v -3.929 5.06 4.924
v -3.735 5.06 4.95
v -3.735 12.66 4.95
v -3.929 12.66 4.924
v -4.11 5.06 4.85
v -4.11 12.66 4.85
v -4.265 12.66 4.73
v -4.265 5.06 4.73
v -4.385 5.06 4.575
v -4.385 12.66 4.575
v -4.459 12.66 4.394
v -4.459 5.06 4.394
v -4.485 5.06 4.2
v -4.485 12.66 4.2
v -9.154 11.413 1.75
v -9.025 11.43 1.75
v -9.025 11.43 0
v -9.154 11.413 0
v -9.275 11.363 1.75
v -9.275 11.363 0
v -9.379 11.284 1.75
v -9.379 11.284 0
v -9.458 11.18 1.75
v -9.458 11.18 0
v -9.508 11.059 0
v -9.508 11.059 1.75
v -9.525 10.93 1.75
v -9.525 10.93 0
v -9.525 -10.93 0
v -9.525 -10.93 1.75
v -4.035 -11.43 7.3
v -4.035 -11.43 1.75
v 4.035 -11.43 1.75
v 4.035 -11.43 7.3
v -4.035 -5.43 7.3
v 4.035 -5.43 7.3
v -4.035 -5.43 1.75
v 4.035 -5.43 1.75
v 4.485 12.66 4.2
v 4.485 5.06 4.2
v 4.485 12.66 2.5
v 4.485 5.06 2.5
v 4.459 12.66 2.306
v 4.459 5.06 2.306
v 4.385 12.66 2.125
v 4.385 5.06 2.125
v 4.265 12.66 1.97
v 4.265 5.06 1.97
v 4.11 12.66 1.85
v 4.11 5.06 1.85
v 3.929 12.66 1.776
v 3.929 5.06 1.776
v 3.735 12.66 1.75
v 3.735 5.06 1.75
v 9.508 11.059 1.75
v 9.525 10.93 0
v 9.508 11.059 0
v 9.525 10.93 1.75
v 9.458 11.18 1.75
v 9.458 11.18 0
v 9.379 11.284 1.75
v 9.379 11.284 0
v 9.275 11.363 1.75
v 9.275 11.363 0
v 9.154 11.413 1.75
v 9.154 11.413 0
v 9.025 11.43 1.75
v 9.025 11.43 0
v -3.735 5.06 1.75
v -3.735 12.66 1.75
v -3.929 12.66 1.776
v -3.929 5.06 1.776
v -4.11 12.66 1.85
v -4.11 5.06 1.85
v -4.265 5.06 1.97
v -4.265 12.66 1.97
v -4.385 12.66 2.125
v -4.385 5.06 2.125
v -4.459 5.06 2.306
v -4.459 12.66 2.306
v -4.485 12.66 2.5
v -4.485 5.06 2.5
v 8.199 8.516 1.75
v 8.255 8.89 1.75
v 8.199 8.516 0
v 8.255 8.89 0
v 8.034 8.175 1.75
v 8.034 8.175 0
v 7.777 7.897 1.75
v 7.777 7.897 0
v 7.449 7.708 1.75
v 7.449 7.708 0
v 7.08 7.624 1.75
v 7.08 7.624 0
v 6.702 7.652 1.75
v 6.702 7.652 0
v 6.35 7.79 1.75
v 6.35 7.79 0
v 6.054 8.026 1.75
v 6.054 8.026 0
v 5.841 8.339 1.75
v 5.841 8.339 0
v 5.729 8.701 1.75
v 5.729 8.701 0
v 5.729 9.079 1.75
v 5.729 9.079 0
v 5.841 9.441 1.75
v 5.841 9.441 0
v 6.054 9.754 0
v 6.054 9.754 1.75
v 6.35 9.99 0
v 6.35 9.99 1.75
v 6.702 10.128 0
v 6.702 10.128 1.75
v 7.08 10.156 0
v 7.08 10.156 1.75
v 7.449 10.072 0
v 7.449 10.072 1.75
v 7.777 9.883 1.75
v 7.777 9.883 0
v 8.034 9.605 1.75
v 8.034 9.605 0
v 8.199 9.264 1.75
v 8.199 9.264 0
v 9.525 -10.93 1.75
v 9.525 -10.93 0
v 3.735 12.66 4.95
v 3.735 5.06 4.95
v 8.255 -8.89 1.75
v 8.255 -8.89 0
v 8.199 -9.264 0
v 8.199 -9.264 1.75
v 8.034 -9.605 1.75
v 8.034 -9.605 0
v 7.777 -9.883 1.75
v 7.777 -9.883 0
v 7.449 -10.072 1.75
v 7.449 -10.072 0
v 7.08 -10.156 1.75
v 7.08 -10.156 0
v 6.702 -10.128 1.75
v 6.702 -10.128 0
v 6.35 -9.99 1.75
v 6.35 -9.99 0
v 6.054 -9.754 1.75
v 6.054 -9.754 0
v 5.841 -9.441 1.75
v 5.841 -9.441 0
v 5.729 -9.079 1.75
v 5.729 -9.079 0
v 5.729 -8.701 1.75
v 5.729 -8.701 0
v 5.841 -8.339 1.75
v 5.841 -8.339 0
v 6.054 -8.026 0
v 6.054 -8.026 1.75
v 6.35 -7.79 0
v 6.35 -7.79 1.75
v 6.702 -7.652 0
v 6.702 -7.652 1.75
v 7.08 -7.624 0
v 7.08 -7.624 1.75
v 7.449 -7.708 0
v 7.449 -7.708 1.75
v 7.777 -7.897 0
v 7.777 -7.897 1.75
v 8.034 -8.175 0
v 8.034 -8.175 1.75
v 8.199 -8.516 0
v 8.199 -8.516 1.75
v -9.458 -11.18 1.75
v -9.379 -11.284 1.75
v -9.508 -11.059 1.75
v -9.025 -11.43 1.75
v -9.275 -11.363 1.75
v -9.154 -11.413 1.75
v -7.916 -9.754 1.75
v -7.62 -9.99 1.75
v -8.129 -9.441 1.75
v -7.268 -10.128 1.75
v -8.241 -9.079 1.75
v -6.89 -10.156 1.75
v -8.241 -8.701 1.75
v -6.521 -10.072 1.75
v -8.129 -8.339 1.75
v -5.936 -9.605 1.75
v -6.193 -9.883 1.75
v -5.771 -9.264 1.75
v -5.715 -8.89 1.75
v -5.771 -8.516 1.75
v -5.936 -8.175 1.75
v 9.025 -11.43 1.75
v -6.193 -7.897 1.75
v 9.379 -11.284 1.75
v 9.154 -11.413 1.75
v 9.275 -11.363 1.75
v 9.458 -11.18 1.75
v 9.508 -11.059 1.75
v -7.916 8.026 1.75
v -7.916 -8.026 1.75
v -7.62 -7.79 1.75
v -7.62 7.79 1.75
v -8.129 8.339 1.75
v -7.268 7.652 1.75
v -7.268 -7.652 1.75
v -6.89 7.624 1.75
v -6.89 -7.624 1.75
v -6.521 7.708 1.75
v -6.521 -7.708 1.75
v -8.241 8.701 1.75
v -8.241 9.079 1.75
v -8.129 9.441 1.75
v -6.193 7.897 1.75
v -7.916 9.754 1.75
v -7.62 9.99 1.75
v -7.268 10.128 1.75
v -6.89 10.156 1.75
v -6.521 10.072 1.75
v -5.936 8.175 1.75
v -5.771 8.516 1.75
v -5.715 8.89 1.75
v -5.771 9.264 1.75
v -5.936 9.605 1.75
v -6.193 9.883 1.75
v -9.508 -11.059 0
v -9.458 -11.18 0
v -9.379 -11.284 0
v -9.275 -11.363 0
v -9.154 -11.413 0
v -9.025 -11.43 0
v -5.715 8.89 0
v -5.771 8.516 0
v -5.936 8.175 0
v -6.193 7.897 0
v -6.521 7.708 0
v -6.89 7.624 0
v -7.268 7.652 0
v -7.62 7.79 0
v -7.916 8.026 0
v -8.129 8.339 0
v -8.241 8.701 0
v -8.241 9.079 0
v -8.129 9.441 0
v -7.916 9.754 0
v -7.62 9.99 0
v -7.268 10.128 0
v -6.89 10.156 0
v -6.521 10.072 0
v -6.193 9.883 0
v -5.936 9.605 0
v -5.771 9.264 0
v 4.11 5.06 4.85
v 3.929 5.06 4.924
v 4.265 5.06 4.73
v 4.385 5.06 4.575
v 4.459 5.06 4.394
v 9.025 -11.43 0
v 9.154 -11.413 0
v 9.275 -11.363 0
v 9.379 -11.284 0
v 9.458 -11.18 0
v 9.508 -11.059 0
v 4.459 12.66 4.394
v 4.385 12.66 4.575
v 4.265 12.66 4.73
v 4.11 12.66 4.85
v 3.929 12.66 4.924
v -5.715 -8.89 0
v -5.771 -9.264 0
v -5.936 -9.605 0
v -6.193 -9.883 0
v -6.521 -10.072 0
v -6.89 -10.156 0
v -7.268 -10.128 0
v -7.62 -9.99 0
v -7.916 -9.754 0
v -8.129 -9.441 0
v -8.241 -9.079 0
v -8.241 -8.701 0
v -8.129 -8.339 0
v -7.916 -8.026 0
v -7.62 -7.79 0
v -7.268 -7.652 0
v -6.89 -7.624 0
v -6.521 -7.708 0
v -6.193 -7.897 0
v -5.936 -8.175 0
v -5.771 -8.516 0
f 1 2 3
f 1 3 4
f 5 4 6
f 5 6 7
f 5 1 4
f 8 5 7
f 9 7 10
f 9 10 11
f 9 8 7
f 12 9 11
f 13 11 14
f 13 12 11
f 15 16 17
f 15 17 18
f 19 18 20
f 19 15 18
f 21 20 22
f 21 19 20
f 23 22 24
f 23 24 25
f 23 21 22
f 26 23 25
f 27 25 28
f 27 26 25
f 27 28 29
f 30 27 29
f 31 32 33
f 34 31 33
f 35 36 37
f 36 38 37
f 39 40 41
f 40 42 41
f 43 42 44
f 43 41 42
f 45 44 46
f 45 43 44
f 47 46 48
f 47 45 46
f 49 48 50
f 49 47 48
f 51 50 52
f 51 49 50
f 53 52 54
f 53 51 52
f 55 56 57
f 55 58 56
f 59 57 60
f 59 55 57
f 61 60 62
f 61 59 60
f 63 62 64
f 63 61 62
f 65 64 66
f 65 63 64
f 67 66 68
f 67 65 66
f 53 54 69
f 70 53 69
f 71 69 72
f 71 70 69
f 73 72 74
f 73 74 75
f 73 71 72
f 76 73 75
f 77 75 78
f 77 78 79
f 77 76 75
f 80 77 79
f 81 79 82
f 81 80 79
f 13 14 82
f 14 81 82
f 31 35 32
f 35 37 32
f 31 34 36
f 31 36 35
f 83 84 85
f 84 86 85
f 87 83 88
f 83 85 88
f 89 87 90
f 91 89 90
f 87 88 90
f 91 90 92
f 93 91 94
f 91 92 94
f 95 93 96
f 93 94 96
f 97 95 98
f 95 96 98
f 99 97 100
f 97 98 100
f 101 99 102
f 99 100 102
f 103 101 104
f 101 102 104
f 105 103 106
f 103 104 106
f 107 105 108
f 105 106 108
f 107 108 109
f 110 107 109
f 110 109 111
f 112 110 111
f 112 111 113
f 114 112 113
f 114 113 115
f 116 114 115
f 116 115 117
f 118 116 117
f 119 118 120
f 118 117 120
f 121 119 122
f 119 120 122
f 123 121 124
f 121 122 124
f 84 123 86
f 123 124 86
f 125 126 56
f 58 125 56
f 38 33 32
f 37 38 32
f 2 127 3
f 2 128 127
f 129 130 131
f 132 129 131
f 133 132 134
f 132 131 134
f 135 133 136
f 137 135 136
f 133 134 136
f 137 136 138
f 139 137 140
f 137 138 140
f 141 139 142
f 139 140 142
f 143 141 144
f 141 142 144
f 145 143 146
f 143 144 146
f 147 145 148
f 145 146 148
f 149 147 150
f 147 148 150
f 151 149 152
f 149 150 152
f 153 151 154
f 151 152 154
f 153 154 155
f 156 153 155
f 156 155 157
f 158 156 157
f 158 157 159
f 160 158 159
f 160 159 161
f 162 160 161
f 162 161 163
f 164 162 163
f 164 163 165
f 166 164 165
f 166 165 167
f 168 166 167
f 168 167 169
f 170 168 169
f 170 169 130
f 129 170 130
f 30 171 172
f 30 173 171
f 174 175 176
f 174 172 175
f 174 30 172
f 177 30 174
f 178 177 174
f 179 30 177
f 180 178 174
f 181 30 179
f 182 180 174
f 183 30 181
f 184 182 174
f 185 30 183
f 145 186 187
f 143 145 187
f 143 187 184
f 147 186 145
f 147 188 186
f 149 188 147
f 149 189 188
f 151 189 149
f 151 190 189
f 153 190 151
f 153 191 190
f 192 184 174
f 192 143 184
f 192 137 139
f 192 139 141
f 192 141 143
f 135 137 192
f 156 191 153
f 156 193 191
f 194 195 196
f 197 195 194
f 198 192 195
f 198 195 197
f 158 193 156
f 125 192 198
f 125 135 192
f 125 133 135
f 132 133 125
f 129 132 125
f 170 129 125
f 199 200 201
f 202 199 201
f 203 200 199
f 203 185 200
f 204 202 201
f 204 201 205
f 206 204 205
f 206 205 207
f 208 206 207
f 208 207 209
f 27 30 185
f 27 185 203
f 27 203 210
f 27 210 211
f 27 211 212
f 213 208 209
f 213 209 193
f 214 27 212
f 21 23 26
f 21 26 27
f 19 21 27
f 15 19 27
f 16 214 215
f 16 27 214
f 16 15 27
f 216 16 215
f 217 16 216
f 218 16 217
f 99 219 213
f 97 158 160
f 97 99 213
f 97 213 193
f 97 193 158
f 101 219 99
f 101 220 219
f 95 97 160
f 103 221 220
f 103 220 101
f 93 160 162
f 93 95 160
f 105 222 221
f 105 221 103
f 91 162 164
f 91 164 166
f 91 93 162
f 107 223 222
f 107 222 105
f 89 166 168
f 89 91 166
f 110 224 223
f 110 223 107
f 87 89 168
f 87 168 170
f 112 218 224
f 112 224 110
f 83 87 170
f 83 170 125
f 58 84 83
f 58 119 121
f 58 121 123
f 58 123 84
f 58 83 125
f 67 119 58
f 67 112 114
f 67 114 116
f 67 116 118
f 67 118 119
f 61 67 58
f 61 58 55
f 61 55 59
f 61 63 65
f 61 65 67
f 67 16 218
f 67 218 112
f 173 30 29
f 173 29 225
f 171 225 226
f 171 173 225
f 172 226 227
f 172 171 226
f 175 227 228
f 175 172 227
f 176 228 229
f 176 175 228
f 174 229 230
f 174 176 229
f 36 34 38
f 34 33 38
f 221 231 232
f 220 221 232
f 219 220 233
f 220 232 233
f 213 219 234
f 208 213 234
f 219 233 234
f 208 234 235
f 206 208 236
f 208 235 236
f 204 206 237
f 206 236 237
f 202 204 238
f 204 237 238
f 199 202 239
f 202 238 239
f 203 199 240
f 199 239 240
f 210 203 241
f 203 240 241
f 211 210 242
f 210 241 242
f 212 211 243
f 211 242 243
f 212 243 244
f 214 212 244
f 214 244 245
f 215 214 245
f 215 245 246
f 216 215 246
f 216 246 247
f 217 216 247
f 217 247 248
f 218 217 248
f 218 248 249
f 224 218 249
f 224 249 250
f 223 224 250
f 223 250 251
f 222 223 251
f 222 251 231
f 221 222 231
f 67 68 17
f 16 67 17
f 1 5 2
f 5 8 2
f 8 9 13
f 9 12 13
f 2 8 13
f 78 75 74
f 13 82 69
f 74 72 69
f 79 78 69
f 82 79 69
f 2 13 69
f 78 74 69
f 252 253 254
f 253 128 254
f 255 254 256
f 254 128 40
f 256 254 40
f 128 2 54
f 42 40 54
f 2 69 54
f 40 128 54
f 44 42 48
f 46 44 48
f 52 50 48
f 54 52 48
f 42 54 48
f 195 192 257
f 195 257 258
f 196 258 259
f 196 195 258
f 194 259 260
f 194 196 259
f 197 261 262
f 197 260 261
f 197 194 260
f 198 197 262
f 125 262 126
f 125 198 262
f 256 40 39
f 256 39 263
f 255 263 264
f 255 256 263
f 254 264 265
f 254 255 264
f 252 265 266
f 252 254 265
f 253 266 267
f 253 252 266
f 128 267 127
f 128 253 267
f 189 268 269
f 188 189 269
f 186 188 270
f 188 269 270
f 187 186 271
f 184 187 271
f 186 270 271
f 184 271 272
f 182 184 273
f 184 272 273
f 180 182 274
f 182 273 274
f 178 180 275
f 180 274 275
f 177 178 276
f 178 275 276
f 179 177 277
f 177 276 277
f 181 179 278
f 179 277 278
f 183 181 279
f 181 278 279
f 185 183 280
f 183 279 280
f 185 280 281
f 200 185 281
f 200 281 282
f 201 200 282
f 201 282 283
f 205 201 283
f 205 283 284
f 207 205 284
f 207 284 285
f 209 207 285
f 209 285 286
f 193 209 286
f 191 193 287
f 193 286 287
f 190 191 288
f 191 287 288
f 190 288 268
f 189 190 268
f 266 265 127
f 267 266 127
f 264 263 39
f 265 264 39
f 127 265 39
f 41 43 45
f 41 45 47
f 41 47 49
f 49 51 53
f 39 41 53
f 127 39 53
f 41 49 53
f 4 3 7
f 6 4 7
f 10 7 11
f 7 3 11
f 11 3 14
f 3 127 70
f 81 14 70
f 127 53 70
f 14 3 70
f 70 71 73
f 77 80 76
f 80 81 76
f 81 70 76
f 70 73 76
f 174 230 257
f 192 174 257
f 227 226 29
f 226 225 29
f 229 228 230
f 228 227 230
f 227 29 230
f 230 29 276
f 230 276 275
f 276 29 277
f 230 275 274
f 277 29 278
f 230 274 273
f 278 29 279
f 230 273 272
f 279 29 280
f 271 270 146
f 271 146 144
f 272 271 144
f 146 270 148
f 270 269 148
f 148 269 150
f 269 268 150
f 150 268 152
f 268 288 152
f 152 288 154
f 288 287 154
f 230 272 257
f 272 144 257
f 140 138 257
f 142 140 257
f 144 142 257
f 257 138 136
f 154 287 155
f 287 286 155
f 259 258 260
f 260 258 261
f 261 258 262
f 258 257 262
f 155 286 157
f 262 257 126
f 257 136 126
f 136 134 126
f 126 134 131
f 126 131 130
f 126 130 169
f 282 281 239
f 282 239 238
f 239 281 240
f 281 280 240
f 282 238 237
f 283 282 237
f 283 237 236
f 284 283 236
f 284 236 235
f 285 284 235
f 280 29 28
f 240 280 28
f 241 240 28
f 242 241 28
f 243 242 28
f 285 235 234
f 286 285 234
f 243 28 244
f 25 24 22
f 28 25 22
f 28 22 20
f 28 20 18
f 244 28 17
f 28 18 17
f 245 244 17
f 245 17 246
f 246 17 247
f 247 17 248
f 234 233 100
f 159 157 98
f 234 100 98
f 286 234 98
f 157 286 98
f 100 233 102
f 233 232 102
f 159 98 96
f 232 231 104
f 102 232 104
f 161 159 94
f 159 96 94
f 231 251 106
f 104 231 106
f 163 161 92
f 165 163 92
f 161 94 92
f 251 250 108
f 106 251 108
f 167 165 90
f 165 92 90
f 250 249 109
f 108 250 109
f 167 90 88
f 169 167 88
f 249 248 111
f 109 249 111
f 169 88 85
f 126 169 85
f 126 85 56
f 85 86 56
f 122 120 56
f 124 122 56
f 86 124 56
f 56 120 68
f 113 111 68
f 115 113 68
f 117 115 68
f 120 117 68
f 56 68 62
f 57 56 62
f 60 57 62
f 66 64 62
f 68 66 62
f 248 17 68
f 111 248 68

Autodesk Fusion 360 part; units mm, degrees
sketch "Sketch1" plane through (0, 0, 0) normal (0, 0, 1) x (1, 0, 0)
  line L0 (9.525, 11.43) -> (-9.525, 11.43)
  line L1 (-9.525, 11.43) -> (-9.525, -11.43)
  line L2 (-9.525, -11.43) -> (9.525, -11.43)
  line L3 (9.525, -11.43) -> (9.525, 11.43)
  line L4 (9.525, 11.43) -> (-9.525, -11.43) construction
  line L5 (-9.525, 11.43) -> (9.525, -11.43) construction
  dimension "d1" = 19.05
  dimension "d2" = 22.86
extrude "Extrude1" add sketch "Sketch1" along normal blind 1.75 makes body 1
sketch "Sketch2" plane through (0, 0, 1.75) normal (0, 0, 1) x (-1, 0, 0)
  line L0 (-9.525, 11.43) -> (-9.525, -11.43)
  line L1 (-9.525, -11.43) -> (9.525, -11.43)
  line L2 (9.525, -11.43) -> (9.525, 11.43)
  line L3 (9.525, 11.43) -> (-9.525, 11.43)
  line L4 (0, 11.43) -> (0, -11.43) construction
  line L5 (4.035, 11.43) -> (-4.035, 11.43)
  line L6 (-4.035, 11.43) -> (-4.035, 5.43)
  line L7 (-4.035, 5.43) -> (4.035, 5.43)
  line L8 (4.035, 5.43) -> (4.035, 11.43)
  dimension "d5" = 6
  dimension "d6" = 8.07
extrude "Extrude2" add sketch "Sketch2" along normal blind 5.55 separate body contours L3 L5 L6 L7 L8 makes body 2
sketch "Sketch3" plane through (0, 0, 1.75) normal (0, 0, 1) x (-1, 0, 0)
  line L0 (-9.525, 11.43) -> (-9.525, -11.43)
  line L1 (-9.525, -11.43) -> (9.525, -11.43)
  line L2 (9.525, -11.43) -> (9.525, 11.43)
  line L3 (9.525, 11.43) -> (-9.525, 11.43)
  line L4 (4.485, -5.06) -> (-4.485, -5.06)
  line L5 (-4.485, -5.06) -> (-4.485, -12.66)
  line L6 (-4.485, -12.66) -> (4.485, -12.66)
  line L7 (4.485, -12.66) -> (4.485, -5.06)
  line L8 (0, -11.43) -> (0, 11.5) construction
  point P0 (0, -12.66)
  dimension "d9" = 7.6
  dimension "d10" = 8.97
  dimension "d11" = 1.23
extrude "Extrude3" add sketch "Sketch3" along normal blind 3.2 separate body contours L1 L4 L5 L7 | L1 L5 L6 L7 makes body 3
fillet "Fillet1" radius 0.75 4 edges at (4.485, 8.86, 4.95) (4.485, 8.86, 1.75) (-4.485, 8.86, 4.95) (-4.485, 8.86, 1.75) on bodies 3
sketch "Sketch4" plane through (0, 0, 0) normal (0, 0, -1) x (1, 0, 0)
  line L0 (9.525, -11.43) -> (9.525, 11.43)
  line L1 (9.525, 11.43) -> (-9.525, 11.43)
  line L2 (-9.525, 11.43) -> (-9.525, -11.43)
  line L3 (-9.525, -11.43) -> (9.525, -11.43)
  circle A0 centre (-6.985, 8.89) radius 1.27
  line L4 (0, 0) -> (0, 11.43)
  line L5 (0, 0) -> (-9.525, 0)
  circle A1 centre (6.985, 8.89) radius 1.27
  circle A2 centre (6.985, -8.89) radius 1.27
  circle A3 centre (-6.985, -8.89) radius 1.27
  dimension "d15" = 2.54
  dimension "d21" = 13.97
  dimension "d22" = 17.78
extrude "Extrude4" cut sketch "Sketch4" against normal up to surface (1.75 mm away) contours A0 | A1 | A2 | A3 bodies 1
fillet "Fillet2" radius 0.5 4 edges at (9.525, -11.43, 0.875) (-9.525, -11.43, 0.875) (-9.525, 11.43, 0.875) (9.525, 11.43, 0.875) on bodies 1
